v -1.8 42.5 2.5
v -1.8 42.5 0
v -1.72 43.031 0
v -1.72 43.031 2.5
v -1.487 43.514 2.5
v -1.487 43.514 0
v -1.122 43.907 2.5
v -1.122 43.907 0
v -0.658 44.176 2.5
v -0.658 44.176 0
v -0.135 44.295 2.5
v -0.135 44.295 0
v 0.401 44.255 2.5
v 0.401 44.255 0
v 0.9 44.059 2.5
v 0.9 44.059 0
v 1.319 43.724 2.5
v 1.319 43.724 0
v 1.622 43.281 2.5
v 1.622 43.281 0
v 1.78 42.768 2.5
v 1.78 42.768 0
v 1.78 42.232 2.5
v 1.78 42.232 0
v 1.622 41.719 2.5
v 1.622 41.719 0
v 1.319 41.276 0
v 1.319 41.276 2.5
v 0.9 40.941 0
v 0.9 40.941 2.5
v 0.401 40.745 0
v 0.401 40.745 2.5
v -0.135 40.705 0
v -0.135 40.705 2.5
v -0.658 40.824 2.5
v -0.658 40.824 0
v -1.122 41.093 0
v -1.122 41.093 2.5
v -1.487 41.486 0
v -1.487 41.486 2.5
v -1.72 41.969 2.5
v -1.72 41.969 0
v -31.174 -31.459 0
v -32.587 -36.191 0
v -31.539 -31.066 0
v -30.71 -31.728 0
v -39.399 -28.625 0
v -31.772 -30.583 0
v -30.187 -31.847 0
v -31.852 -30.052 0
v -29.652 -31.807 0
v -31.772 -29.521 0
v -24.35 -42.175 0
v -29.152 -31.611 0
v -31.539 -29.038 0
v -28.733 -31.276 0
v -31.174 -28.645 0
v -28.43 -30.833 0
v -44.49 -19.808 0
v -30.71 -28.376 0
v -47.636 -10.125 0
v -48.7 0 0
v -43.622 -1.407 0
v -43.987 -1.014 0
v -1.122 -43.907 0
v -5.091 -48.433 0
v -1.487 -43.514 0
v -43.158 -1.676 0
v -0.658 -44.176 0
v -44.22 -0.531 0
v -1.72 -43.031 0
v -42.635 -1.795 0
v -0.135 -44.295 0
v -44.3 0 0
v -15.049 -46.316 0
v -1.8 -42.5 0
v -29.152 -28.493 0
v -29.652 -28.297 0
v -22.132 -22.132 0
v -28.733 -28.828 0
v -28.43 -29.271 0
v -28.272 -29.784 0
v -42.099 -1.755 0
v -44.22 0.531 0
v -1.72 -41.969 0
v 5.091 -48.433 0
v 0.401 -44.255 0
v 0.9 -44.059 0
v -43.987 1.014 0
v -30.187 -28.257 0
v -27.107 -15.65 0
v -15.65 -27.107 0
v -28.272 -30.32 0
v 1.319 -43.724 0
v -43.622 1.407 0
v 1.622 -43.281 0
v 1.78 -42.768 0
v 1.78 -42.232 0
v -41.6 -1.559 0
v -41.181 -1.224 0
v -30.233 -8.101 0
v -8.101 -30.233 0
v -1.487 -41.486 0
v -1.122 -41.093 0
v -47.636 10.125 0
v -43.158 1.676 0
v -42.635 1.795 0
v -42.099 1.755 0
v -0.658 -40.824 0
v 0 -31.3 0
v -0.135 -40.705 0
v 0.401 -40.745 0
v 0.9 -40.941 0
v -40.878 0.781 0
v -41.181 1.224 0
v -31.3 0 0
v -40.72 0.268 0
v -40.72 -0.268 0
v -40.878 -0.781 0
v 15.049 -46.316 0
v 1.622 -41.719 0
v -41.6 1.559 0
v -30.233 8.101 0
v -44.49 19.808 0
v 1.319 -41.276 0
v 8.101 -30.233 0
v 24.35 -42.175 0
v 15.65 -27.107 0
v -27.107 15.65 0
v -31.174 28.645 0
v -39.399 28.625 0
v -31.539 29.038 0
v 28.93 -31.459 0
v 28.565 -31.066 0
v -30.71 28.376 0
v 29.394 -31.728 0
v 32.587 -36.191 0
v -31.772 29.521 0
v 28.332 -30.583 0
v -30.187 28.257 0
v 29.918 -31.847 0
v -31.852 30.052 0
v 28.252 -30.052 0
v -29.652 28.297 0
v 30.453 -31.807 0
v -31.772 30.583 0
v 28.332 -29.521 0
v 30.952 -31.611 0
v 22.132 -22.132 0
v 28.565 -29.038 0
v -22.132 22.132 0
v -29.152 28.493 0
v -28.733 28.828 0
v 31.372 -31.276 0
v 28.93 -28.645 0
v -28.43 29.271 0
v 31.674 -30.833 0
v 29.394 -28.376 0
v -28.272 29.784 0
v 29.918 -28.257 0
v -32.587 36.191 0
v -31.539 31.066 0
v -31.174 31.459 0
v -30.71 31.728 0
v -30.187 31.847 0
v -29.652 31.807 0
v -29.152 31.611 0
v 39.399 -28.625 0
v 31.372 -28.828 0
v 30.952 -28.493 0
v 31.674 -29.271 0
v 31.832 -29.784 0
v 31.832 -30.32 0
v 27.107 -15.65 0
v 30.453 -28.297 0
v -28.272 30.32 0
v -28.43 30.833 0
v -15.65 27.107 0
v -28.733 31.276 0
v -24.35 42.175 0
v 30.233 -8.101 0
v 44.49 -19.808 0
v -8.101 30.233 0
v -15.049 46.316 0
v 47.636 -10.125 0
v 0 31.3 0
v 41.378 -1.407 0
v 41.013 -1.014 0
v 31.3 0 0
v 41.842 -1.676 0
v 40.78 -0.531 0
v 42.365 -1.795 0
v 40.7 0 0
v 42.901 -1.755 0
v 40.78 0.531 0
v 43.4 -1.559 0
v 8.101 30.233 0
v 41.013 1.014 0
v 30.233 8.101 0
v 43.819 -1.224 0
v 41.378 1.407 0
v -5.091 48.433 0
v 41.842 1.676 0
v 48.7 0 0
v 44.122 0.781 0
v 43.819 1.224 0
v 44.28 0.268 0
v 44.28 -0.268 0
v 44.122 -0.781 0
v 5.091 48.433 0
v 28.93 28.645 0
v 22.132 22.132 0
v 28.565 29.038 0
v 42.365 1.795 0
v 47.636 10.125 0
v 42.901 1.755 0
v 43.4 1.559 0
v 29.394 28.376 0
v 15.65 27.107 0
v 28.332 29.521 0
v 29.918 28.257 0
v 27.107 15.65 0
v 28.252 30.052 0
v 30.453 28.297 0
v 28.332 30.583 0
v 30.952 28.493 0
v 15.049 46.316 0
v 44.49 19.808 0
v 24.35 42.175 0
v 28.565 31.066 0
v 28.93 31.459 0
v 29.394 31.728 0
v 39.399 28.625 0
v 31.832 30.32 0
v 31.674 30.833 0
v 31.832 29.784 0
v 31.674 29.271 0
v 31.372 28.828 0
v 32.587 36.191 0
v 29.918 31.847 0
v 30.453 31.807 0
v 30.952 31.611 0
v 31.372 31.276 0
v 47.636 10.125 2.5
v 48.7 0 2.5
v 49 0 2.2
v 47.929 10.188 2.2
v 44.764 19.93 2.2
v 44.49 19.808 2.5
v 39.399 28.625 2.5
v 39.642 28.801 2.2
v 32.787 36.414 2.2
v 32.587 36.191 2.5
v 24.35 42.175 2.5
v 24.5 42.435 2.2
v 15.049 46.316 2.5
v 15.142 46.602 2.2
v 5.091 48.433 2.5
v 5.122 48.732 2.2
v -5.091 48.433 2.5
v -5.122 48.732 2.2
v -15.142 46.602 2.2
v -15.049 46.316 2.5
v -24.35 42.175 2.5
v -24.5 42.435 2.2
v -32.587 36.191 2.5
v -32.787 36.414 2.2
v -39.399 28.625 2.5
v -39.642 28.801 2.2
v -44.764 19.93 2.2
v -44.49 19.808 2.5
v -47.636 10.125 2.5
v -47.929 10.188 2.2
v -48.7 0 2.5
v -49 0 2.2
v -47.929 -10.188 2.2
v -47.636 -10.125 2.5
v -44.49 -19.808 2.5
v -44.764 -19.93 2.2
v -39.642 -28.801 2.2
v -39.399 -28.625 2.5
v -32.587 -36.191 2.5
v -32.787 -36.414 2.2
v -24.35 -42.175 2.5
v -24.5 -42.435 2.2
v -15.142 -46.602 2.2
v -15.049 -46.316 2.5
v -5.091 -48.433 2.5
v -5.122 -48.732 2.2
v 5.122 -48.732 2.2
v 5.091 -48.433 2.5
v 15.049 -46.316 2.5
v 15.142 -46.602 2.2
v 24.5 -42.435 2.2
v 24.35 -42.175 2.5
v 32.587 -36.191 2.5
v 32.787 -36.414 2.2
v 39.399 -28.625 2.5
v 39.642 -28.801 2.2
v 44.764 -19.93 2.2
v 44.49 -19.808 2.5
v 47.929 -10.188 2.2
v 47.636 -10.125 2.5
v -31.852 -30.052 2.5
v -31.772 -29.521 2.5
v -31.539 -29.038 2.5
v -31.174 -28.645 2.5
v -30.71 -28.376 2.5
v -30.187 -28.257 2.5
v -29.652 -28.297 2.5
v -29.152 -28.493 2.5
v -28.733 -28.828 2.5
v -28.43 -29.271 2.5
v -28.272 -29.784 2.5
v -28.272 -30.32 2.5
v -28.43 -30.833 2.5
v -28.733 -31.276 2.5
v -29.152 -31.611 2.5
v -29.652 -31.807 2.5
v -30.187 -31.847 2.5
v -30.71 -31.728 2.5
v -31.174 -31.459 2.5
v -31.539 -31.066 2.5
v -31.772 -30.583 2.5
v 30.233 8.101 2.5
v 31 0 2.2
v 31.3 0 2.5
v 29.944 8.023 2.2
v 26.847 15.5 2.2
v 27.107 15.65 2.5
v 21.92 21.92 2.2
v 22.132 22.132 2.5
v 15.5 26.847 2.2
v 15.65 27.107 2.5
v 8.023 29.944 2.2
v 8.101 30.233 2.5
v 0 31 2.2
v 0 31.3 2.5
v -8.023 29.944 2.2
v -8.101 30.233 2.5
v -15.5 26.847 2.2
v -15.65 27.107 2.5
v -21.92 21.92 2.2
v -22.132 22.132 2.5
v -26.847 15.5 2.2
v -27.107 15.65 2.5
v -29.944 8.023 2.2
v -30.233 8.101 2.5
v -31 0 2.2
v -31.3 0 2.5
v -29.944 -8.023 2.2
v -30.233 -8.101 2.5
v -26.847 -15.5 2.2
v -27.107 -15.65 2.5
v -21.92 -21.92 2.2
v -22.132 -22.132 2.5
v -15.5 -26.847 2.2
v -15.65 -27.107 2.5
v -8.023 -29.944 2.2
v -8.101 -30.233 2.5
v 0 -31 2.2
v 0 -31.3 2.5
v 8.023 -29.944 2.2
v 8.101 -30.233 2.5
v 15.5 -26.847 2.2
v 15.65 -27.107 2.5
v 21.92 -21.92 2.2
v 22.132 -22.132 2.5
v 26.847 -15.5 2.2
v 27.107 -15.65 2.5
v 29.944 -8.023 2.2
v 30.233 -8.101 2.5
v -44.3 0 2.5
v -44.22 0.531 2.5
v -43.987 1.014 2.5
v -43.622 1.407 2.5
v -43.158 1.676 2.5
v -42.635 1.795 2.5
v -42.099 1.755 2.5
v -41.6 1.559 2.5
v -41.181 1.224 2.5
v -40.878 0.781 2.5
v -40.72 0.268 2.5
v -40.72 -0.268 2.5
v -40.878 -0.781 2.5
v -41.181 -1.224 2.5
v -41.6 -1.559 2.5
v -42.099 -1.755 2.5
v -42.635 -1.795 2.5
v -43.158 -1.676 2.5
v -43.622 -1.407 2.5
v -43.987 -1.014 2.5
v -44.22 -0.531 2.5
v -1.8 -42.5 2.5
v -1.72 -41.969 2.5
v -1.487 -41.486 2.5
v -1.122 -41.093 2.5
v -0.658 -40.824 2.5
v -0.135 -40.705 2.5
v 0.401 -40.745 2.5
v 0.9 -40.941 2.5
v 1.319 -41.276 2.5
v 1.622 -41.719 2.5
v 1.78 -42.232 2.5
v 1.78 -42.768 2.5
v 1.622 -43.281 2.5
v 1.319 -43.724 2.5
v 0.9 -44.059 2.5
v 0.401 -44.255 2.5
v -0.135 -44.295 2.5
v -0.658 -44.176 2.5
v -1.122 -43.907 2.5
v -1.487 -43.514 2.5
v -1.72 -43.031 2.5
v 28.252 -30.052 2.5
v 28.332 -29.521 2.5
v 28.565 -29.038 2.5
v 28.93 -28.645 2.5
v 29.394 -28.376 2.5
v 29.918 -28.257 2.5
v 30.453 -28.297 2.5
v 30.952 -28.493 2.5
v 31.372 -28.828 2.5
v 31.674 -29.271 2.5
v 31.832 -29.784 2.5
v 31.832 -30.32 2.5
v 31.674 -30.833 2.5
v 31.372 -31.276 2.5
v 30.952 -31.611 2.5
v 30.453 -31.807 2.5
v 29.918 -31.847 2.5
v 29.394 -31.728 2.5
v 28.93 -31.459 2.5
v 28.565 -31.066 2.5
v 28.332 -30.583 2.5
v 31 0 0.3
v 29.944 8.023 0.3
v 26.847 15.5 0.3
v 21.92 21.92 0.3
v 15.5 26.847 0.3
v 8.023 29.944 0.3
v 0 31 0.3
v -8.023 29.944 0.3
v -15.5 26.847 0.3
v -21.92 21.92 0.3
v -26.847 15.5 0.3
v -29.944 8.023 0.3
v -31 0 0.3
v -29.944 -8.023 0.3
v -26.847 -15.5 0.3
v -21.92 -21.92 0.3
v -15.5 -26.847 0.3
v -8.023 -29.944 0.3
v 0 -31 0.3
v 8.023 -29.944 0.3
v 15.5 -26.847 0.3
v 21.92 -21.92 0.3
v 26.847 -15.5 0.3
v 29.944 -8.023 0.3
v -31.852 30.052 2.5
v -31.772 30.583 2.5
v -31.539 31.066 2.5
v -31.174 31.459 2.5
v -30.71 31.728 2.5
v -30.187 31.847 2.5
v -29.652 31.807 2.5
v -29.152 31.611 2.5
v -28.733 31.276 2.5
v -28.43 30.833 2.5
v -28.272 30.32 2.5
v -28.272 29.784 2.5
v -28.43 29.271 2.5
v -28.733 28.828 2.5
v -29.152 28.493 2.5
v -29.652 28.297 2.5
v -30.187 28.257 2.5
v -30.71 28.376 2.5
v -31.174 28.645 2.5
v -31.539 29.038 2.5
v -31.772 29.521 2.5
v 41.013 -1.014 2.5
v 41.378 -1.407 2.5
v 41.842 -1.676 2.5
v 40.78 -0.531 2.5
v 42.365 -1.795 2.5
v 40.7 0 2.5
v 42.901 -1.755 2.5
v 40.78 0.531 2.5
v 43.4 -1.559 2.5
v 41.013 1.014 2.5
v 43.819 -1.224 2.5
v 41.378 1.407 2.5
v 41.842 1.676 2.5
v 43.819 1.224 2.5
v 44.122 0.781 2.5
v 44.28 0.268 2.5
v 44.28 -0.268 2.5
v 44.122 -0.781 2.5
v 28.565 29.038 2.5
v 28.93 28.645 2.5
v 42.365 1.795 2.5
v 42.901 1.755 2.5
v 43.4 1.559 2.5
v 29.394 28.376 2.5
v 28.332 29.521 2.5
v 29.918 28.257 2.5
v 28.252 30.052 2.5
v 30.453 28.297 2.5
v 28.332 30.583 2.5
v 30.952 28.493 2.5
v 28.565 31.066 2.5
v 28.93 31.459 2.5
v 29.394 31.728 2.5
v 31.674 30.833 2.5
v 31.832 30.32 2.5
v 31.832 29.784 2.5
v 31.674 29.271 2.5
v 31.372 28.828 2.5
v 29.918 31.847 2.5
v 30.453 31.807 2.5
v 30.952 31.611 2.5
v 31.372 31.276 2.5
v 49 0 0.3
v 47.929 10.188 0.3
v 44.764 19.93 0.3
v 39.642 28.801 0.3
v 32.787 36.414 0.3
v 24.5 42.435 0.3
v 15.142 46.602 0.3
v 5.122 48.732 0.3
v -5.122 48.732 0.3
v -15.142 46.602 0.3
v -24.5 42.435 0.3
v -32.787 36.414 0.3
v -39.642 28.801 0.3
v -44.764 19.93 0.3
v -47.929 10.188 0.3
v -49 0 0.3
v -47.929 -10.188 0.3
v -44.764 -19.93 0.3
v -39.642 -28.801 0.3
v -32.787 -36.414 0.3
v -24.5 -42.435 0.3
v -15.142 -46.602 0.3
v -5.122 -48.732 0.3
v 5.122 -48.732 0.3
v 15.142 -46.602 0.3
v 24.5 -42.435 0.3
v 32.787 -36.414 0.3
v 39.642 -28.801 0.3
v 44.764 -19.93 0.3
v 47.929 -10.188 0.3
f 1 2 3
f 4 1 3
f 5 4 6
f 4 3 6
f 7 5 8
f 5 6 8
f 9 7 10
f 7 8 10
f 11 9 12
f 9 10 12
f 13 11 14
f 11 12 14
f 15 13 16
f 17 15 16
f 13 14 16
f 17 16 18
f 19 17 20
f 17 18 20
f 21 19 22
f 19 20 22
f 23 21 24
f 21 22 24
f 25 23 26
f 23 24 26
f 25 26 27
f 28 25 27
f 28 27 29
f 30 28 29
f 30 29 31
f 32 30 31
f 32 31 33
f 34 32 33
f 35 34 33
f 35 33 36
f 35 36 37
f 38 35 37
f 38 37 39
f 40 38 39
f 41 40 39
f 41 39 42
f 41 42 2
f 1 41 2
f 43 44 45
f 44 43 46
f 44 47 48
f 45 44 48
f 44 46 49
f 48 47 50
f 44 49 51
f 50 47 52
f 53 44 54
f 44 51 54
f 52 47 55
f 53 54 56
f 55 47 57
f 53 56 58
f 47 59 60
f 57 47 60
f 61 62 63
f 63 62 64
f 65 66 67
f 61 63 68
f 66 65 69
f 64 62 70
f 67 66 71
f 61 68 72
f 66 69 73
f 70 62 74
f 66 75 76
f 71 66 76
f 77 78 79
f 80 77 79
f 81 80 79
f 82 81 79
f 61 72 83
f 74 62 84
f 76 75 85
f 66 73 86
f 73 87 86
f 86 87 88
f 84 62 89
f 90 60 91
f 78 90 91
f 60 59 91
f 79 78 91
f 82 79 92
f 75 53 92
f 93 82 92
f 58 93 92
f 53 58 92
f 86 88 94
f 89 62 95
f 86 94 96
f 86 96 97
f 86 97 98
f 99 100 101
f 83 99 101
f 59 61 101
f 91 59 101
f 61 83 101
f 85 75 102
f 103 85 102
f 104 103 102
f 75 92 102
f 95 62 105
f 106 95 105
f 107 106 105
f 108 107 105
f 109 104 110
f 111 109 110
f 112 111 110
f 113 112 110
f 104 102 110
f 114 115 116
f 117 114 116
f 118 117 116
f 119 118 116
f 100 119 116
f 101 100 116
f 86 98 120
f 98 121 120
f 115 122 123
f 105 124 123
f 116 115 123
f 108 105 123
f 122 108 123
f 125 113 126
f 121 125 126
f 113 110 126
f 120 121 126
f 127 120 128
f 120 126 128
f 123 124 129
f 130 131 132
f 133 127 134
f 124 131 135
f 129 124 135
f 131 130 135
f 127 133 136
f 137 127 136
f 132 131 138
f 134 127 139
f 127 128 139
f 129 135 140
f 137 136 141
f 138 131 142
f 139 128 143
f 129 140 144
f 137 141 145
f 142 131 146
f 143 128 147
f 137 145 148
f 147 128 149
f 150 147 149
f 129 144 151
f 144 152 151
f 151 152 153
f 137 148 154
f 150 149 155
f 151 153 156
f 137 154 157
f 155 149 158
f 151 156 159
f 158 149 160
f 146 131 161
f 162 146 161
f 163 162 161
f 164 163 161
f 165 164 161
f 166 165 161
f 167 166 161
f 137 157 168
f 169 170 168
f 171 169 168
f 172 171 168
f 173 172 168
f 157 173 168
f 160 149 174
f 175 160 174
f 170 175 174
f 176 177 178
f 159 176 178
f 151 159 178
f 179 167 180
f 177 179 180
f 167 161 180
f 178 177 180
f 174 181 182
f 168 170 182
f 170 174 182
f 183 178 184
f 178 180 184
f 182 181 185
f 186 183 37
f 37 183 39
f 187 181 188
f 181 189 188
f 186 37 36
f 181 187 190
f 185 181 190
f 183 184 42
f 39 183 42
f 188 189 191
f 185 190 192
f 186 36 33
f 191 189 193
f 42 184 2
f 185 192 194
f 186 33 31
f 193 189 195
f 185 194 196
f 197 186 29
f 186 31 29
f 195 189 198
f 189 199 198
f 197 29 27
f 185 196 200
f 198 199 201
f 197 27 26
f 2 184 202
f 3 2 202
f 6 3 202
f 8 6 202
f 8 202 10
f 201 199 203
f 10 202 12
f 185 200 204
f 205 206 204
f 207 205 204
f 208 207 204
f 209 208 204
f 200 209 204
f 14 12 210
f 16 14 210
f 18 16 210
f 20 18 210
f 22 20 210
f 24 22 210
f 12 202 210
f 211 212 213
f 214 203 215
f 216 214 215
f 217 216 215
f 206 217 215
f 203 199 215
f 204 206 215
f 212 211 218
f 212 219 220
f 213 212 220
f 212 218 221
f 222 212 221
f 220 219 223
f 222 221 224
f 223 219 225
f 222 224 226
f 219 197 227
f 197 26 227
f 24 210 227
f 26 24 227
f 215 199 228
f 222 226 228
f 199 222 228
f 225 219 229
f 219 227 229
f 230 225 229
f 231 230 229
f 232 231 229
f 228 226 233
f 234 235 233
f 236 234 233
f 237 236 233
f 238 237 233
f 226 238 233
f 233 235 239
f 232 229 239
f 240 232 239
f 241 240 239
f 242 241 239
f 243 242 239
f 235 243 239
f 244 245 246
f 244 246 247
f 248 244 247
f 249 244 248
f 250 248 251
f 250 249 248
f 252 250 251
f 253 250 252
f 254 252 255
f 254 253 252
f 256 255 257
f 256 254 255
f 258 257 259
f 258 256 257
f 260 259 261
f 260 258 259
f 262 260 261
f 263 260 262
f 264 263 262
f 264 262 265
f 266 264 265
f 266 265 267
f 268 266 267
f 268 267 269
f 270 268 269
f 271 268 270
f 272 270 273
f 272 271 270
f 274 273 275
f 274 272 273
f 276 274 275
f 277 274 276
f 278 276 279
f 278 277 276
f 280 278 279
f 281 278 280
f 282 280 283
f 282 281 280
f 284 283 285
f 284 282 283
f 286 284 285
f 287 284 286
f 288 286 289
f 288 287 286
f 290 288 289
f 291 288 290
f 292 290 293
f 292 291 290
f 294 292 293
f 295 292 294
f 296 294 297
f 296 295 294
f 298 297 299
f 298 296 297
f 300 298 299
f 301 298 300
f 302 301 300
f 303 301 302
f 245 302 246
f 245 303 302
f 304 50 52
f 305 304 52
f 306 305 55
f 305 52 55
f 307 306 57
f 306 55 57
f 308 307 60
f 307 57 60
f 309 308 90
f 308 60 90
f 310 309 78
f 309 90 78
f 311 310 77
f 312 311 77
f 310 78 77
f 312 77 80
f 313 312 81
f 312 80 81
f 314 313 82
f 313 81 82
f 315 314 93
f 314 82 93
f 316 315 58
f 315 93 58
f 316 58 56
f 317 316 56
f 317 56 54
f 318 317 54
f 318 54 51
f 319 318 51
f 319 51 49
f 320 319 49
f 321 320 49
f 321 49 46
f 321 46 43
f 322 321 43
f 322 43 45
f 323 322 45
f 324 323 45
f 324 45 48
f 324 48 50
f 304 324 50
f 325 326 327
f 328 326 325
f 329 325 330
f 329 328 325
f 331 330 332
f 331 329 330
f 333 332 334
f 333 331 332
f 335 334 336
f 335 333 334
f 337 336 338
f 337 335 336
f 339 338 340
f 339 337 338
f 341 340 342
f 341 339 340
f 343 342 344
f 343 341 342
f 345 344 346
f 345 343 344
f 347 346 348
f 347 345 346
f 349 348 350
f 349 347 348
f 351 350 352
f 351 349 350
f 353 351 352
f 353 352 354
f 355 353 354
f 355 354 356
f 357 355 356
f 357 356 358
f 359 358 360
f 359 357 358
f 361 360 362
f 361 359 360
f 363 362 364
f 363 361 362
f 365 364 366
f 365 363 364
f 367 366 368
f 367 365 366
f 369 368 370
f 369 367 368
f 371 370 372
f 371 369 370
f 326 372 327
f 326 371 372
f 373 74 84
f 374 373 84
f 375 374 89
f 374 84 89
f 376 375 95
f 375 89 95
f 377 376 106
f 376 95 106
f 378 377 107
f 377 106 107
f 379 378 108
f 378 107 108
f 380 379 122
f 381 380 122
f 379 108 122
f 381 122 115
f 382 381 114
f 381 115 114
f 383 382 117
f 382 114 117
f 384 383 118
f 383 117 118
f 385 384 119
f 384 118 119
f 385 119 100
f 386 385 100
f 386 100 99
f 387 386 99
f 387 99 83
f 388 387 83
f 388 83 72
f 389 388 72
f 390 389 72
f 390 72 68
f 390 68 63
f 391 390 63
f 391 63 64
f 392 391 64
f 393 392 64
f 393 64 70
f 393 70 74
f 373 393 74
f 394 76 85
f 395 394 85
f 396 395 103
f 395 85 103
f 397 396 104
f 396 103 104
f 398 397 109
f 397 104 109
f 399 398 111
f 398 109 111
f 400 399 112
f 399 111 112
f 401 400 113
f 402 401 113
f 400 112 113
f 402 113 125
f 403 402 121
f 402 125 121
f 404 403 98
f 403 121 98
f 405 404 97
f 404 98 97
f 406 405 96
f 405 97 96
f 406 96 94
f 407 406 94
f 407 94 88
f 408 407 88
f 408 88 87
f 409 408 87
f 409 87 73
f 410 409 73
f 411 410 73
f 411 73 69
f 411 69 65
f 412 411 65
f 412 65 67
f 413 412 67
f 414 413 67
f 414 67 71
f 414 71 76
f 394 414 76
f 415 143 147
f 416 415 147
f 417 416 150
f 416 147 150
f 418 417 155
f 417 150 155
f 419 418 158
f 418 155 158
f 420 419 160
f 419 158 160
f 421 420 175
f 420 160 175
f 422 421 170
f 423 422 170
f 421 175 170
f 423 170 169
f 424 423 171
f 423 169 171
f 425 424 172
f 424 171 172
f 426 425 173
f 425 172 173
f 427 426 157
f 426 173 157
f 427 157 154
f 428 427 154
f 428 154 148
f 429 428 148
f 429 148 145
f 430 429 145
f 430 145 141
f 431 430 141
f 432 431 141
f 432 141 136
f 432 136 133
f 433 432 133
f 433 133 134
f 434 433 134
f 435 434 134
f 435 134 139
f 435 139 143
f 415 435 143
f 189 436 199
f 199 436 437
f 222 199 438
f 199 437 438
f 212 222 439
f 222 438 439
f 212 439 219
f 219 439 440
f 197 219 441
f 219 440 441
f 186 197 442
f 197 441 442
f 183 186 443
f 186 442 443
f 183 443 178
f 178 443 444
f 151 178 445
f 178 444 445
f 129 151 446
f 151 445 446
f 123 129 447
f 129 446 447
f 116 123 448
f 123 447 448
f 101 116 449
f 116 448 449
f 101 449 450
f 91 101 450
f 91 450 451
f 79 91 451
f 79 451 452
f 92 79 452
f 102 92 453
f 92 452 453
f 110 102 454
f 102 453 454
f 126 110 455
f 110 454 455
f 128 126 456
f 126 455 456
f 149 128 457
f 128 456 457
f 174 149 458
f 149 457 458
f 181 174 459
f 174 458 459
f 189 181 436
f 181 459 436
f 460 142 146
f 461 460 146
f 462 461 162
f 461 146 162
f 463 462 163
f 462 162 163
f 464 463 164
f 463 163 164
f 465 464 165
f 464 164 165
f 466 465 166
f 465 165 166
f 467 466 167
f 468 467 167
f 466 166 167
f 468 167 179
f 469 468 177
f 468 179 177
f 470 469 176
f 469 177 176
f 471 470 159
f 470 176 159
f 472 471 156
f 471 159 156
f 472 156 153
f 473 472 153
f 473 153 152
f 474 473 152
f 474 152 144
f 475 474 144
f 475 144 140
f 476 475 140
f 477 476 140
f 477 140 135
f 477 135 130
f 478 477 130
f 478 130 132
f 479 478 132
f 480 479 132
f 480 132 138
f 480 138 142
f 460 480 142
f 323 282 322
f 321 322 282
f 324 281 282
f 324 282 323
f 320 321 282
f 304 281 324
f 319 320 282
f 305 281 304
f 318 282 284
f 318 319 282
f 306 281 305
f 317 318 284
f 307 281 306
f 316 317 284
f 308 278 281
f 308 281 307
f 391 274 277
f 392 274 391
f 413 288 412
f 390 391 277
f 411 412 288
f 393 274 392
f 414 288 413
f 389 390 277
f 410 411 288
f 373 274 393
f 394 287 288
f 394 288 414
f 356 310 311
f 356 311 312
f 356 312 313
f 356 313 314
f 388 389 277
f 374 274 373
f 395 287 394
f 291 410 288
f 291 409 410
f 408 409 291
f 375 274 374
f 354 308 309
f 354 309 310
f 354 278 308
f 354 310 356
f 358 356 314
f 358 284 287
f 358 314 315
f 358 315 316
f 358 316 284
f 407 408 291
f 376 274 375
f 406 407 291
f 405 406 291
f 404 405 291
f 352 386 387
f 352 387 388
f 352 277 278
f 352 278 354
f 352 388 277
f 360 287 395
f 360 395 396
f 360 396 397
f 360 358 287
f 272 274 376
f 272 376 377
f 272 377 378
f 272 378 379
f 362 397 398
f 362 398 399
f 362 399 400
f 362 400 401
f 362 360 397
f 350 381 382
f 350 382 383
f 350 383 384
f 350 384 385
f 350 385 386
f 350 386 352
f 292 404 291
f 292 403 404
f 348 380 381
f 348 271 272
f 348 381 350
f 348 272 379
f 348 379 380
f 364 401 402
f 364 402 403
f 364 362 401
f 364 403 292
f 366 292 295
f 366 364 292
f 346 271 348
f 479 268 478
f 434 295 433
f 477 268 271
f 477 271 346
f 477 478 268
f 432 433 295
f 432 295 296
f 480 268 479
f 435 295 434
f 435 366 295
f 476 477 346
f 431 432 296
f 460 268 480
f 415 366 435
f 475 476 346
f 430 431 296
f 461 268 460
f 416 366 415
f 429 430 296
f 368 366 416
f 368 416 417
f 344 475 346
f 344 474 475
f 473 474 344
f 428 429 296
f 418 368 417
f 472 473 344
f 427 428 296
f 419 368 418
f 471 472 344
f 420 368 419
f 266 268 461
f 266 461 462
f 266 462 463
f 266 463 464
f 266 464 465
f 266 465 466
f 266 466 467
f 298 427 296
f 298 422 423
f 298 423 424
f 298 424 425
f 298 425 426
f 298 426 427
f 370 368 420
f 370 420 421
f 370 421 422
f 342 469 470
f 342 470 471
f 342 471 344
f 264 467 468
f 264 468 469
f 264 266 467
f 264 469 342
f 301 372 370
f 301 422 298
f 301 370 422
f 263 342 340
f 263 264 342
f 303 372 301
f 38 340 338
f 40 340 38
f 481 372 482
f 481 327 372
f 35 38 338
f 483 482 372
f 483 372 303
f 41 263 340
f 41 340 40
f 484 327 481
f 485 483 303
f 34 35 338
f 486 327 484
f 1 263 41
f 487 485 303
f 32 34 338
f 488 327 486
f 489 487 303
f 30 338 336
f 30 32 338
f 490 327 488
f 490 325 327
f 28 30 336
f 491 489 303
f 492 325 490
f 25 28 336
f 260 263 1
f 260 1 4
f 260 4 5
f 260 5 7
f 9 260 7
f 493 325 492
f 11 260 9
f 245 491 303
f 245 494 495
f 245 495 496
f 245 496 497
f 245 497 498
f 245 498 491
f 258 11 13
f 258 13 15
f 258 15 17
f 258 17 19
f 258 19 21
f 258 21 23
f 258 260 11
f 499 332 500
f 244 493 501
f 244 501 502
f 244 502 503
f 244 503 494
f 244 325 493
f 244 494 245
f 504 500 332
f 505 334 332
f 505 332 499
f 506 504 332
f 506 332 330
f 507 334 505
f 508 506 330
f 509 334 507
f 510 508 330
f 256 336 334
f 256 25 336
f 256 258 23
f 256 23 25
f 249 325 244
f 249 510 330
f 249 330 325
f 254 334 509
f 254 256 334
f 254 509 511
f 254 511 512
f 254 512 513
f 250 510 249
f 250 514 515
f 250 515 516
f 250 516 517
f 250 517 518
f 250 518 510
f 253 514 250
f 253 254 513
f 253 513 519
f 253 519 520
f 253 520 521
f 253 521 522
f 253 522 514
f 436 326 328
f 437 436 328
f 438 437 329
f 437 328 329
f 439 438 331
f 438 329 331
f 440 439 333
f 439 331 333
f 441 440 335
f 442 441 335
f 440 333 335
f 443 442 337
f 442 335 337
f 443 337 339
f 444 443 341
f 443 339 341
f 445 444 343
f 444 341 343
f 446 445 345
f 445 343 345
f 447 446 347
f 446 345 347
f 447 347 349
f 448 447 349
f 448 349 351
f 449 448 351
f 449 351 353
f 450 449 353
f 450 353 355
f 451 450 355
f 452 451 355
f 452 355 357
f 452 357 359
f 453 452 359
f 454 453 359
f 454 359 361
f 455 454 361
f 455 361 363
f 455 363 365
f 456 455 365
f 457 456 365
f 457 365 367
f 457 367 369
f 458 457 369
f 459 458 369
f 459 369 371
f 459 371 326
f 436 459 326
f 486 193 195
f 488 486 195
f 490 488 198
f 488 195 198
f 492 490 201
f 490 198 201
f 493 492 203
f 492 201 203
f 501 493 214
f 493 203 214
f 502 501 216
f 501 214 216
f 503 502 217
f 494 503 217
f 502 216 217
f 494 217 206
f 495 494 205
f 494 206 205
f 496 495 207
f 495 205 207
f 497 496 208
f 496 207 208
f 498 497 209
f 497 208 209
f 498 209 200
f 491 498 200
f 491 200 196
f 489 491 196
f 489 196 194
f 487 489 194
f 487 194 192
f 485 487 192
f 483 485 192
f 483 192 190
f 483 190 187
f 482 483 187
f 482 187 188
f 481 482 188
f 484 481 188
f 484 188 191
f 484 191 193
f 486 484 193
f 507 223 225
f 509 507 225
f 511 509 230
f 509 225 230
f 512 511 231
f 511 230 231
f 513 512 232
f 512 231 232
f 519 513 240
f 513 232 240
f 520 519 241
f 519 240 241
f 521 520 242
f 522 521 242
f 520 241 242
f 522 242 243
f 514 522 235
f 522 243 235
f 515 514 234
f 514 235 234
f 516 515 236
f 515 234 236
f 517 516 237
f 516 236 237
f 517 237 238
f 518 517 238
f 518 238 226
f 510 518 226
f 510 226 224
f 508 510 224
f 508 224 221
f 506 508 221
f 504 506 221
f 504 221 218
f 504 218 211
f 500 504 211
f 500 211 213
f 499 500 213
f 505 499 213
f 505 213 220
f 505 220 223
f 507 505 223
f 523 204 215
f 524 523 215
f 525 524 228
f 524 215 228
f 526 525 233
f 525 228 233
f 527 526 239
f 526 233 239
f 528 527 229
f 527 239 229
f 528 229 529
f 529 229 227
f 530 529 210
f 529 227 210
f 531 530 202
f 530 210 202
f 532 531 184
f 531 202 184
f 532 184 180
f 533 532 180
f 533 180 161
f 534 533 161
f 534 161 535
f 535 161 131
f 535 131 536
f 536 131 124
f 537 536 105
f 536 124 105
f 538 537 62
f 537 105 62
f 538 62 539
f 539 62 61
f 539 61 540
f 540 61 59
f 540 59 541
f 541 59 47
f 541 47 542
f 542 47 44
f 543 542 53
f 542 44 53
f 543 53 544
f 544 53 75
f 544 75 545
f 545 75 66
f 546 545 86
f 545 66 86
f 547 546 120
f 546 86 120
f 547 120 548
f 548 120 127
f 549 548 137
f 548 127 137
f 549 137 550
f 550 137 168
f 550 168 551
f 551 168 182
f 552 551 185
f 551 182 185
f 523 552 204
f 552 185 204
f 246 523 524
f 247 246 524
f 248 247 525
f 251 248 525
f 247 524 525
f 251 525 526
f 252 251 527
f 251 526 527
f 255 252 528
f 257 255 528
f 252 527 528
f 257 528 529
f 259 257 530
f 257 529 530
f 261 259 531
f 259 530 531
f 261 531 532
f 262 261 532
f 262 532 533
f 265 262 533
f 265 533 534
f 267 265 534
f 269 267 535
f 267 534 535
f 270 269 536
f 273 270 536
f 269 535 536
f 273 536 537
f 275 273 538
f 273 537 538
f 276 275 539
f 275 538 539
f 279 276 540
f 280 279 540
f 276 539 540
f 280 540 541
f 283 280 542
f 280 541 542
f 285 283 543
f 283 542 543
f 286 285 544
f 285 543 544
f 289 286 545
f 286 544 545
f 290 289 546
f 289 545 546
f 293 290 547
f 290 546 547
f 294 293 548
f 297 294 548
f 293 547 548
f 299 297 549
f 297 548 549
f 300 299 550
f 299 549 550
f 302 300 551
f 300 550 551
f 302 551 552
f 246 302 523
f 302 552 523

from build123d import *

# Parameters (mm, degrees)
SKETCH1_R                = 49
BOSS_EXTRUDE1_DEPTH      = 2.5
M3_CLEARANCE_HOLE1_D     = 3.6
M3_CLEARANCE_HOLE1_DEPTH = 20
M3_CLEARANCE_HOLE1_TIP   = 1.081549114
SKETCH4_R                = 31
CUT_EXTRUDE1_DEPTH       = 70.341545988
CHAMFER1_SIZE            = 0.3


with BuildPart() as part:
    # Sketch1 → Boss-Extrude1 (new body)
    with BuildSketch(Plane.XY):
        Circle(SKETCH1_R)
    extrude(amount=BOSS_EXTRUDE1_DEPTH)

    # M3 Clearance Hole1
    with Locations(Plane.XY.offset(2.5)):
        with Locations((-30.0520382, 30.0520382), (0, 42.5), (30.0520382, 30.0520382), (42.5, 0), (30.0520382, -30.0520382), (0, -42.5), (-30.0520382, -30.0520382), (-42.5, 0)):
            Hole(M3_CLEARANCE_HOLE1_D / 2, depth=M3_CLEARANCE_HOLE1_DEPTH)
            with Locations((0, 0, -(M3_CLEARANCE_HOLE1_DEPTH + M3_CLEARANCE_HOLE1_TIP / 2))):  # 118° drill point
                Cone(0, M3_CLEARANCE_HOLE1_D / 2, M3_CLEARANCE_HOLE1_TIP, mode=Mode.SUBTRACT)

    # Sketch4 → Cut-Extrude1 (cut, through all)
    with BuildSketch(Plane.XY.offset(2.5)):
        Circle(SKETCH4_R)
    extrude(amount=-CUT_EXTRUDE1_DEPTH, mode=Mode.SUBTRACT)

    # Chamfer1
    chamfer1_edges = [part.edges().sort_by_distance(p)[0] for p in [
        (-49, 0, 0),
        (-49, 0, 2.5),
        (-31, 0, 0),
        (-31, 0, 2.5),
    ]]
    chamfer(chamfer1_edges, length=CHAMFER1_SIZE)


solid = part.part
